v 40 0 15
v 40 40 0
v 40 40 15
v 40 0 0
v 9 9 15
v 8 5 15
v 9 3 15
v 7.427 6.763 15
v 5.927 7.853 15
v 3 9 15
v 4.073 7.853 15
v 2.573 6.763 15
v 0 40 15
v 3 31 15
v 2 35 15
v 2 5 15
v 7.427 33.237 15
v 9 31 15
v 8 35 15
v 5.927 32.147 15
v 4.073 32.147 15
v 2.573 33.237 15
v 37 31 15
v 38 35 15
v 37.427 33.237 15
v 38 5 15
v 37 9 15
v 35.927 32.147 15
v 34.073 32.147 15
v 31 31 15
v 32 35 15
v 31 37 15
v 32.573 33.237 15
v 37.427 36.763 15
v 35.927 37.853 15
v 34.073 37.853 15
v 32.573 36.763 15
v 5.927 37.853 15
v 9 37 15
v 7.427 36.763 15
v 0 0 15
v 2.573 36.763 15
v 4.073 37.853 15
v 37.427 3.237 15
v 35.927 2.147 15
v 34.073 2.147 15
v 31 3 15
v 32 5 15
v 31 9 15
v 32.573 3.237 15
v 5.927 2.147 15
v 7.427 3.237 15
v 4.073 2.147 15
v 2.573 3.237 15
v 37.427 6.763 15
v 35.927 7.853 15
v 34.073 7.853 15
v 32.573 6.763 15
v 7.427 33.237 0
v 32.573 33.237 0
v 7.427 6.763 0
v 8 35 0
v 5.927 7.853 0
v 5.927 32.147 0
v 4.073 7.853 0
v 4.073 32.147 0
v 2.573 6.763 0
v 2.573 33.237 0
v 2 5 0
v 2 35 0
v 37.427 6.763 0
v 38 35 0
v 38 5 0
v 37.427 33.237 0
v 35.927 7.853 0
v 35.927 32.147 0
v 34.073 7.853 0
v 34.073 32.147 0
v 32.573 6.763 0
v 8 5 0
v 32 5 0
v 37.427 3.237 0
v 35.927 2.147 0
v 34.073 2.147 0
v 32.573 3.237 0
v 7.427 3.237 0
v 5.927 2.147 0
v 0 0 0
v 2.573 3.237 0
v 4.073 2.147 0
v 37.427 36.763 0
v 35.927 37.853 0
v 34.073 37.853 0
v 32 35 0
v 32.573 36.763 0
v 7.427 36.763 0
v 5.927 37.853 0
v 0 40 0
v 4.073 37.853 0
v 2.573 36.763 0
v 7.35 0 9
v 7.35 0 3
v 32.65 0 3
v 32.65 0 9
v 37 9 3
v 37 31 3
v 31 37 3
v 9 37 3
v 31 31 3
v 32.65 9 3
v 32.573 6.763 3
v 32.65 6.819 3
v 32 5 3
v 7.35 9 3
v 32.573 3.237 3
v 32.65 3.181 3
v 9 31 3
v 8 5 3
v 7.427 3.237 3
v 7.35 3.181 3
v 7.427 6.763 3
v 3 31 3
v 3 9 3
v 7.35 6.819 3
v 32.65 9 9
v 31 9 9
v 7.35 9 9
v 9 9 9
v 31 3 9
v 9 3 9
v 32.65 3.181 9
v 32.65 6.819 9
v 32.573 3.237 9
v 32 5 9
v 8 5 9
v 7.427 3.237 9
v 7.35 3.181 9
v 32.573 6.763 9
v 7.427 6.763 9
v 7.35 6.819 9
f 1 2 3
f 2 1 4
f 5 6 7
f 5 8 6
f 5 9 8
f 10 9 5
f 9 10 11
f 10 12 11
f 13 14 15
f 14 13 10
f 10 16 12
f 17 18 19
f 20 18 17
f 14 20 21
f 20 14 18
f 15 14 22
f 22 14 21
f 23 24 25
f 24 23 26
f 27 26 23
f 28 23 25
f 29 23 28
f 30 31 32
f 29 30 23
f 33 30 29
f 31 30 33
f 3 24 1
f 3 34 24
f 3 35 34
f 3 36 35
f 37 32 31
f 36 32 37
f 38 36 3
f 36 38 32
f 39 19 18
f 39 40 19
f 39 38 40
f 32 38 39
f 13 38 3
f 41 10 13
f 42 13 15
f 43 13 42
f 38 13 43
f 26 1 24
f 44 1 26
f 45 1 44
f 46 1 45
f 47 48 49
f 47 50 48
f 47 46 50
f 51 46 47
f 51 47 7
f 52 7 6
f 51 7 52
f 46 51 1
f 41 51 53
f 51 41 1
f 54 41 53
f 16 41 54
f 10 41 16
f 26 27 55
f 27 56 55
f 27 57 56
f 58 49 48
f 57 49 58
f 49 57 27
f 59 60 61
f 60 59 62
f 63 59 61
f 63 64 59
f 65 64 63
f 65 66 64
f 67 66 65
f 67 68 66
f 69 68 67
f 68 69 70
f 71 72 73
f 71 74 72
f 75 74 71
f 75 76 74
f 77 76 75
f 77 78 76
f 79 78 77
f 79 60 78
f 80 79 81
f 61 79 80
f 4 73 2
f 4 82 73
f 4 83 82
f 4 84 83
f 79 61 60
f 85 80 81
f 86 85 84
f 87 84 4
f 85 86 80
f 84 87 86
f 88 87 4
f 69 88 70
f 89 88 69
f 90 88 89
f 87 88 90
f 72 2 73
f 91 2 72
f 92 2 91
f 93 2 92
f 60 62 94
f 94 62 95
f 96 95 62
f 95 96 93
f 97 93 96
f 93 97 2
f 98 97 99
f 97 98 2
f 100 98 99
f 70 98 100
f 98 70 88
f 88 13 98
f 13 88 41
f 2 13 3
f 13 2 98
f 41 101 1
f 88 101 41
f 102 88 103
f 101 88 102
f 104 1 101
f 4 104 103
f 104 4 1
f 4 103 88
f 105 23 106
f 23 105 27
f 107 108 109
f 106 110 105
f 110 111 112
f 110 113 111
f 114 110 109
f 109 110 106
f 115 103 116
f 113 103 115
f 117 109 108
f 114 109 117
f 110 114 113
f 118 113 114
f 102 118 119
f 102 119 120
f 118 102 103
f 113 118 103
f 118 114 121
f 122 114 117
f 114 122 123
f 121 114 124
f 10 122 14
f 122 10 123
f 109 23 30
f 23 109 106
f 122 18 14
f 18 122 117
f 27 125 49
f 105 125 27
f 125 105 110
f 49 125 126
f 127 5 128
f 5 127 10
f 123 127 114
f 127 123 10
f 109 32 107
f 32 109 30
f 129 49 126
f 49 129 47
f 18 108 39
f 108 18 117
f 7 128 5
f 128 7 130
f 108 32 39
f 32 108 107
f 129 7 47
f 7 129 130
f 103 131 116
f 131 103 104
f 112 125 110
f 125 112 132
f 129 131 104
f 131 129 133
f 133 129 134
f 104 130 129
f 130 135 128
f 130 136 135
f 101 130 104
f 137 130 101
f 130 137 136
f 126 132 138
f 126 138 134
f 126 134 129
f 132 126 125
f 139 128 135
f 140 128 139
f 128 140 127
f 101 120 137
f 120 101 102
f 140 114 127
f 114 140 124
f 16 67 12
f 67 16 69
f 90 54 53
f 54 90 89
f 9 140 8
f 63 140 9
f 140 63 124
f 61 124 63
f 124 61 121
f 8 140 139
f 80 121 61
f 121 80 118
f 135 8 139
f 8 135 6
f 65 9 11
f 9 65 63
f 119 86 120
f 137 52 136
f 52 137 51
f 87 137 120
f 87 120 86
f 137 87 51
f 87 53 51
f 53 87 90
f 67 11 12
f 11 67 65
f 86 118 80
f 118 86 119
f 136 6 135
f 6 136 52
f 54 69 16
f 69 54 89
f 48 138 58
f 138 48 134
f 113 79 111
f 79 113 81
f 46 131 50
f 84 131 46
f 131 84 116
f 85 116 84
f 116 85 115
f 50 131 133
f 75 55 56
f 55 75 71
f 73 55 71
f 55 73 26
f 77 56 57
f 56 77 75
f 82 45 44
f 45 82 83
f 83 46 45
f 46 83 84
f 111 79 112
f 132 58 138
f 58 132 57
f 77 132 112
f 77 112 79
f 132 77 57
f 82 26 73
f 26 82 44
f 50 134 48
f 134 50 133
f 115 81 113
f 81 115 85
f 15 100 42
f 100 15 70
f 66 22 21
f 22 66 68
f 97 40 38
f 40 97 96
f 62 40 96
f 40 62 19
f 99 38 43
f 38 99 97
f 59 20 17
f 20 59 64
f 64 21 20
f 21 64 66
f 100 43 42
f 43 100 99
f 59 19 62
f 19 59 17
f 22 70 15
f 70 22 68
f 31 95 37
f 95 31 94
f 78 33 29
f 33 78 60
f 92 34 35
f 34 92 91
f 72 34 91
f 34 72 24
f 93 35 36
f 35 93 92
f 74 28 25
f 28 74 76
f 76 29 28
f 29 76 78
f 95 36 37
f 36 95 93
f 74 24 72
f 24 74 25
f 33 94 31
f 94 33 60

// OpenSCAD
ScrewOffset = 5;
ScrewHole = 3;

BoxEdgeMM = 40;
BoxHeight = 15;
BoxEdgeMMthickness = 3;
//BoxEdgeMMthickness = ScrewOffset + 3;
VentWidgh = 25.3;
VentHeight = 6;
VentCenter = (BoxEdgeMM - VentWidgh)/2;

boxscrew0 = ScrewOffset;
boxscrew1 = BoxEdgeMM - ScrewOffset;

difference (){
    //cube([x,y,z], center = true/false);
    cube([BoxEdgeMM,BoxEdgeMM,BoxHeight], center=false);

    //Remove the following shapes
    //Translates (moves) its child elements along the specified vector. The argument name is optional.
    //    translate([x, y, z]) { ... }
    translate ([BoxEdgeMMthickness,BoxEdgeMMthickness*3,BoxEdgeMMthickness])
        cube([BoxEdgeMM - (BoxEdgeMMthickness*2),BoxEdgeMM - (BoxEdgeMMthickness*6),30], center=false);
    translate ([BoxEdgeMMthickness*3,BoxEdgeMMthickness,BoxEdgeMMthickness])
        cube([BoxEdgeMM - (BoxEdgeMMthickness*6),BoxEdgeMM - (BoxEdgeMMthickness*2),30], center=false);
    //vent hole
    translate([VentCenter,0,BoxEdgeMMthickness])
        cube([VentWidgh,20,VentHeight]);
    //Screw holes        
    translate([boxscrew0,boxscrew0,-3])
        cylinder(BoxHeight+5,ScrewHole,ScrewHole,center=false);
    translate([boxscrew1,boxscrew0,-3])
        cylinder(BoxHeight+5,ScrewHole,ScrewHole,center=false);
    translate([boxscrew0,boxscrew1,-3])
        cylinder(BoxHeight+5,ScrewHole,ScrewHole,center=false);
    translate([boxscrew1,boxscrew1,-3])
        cylinder(BoxHeight+5,ScrewHole,ScrewHole,center=false);
}
